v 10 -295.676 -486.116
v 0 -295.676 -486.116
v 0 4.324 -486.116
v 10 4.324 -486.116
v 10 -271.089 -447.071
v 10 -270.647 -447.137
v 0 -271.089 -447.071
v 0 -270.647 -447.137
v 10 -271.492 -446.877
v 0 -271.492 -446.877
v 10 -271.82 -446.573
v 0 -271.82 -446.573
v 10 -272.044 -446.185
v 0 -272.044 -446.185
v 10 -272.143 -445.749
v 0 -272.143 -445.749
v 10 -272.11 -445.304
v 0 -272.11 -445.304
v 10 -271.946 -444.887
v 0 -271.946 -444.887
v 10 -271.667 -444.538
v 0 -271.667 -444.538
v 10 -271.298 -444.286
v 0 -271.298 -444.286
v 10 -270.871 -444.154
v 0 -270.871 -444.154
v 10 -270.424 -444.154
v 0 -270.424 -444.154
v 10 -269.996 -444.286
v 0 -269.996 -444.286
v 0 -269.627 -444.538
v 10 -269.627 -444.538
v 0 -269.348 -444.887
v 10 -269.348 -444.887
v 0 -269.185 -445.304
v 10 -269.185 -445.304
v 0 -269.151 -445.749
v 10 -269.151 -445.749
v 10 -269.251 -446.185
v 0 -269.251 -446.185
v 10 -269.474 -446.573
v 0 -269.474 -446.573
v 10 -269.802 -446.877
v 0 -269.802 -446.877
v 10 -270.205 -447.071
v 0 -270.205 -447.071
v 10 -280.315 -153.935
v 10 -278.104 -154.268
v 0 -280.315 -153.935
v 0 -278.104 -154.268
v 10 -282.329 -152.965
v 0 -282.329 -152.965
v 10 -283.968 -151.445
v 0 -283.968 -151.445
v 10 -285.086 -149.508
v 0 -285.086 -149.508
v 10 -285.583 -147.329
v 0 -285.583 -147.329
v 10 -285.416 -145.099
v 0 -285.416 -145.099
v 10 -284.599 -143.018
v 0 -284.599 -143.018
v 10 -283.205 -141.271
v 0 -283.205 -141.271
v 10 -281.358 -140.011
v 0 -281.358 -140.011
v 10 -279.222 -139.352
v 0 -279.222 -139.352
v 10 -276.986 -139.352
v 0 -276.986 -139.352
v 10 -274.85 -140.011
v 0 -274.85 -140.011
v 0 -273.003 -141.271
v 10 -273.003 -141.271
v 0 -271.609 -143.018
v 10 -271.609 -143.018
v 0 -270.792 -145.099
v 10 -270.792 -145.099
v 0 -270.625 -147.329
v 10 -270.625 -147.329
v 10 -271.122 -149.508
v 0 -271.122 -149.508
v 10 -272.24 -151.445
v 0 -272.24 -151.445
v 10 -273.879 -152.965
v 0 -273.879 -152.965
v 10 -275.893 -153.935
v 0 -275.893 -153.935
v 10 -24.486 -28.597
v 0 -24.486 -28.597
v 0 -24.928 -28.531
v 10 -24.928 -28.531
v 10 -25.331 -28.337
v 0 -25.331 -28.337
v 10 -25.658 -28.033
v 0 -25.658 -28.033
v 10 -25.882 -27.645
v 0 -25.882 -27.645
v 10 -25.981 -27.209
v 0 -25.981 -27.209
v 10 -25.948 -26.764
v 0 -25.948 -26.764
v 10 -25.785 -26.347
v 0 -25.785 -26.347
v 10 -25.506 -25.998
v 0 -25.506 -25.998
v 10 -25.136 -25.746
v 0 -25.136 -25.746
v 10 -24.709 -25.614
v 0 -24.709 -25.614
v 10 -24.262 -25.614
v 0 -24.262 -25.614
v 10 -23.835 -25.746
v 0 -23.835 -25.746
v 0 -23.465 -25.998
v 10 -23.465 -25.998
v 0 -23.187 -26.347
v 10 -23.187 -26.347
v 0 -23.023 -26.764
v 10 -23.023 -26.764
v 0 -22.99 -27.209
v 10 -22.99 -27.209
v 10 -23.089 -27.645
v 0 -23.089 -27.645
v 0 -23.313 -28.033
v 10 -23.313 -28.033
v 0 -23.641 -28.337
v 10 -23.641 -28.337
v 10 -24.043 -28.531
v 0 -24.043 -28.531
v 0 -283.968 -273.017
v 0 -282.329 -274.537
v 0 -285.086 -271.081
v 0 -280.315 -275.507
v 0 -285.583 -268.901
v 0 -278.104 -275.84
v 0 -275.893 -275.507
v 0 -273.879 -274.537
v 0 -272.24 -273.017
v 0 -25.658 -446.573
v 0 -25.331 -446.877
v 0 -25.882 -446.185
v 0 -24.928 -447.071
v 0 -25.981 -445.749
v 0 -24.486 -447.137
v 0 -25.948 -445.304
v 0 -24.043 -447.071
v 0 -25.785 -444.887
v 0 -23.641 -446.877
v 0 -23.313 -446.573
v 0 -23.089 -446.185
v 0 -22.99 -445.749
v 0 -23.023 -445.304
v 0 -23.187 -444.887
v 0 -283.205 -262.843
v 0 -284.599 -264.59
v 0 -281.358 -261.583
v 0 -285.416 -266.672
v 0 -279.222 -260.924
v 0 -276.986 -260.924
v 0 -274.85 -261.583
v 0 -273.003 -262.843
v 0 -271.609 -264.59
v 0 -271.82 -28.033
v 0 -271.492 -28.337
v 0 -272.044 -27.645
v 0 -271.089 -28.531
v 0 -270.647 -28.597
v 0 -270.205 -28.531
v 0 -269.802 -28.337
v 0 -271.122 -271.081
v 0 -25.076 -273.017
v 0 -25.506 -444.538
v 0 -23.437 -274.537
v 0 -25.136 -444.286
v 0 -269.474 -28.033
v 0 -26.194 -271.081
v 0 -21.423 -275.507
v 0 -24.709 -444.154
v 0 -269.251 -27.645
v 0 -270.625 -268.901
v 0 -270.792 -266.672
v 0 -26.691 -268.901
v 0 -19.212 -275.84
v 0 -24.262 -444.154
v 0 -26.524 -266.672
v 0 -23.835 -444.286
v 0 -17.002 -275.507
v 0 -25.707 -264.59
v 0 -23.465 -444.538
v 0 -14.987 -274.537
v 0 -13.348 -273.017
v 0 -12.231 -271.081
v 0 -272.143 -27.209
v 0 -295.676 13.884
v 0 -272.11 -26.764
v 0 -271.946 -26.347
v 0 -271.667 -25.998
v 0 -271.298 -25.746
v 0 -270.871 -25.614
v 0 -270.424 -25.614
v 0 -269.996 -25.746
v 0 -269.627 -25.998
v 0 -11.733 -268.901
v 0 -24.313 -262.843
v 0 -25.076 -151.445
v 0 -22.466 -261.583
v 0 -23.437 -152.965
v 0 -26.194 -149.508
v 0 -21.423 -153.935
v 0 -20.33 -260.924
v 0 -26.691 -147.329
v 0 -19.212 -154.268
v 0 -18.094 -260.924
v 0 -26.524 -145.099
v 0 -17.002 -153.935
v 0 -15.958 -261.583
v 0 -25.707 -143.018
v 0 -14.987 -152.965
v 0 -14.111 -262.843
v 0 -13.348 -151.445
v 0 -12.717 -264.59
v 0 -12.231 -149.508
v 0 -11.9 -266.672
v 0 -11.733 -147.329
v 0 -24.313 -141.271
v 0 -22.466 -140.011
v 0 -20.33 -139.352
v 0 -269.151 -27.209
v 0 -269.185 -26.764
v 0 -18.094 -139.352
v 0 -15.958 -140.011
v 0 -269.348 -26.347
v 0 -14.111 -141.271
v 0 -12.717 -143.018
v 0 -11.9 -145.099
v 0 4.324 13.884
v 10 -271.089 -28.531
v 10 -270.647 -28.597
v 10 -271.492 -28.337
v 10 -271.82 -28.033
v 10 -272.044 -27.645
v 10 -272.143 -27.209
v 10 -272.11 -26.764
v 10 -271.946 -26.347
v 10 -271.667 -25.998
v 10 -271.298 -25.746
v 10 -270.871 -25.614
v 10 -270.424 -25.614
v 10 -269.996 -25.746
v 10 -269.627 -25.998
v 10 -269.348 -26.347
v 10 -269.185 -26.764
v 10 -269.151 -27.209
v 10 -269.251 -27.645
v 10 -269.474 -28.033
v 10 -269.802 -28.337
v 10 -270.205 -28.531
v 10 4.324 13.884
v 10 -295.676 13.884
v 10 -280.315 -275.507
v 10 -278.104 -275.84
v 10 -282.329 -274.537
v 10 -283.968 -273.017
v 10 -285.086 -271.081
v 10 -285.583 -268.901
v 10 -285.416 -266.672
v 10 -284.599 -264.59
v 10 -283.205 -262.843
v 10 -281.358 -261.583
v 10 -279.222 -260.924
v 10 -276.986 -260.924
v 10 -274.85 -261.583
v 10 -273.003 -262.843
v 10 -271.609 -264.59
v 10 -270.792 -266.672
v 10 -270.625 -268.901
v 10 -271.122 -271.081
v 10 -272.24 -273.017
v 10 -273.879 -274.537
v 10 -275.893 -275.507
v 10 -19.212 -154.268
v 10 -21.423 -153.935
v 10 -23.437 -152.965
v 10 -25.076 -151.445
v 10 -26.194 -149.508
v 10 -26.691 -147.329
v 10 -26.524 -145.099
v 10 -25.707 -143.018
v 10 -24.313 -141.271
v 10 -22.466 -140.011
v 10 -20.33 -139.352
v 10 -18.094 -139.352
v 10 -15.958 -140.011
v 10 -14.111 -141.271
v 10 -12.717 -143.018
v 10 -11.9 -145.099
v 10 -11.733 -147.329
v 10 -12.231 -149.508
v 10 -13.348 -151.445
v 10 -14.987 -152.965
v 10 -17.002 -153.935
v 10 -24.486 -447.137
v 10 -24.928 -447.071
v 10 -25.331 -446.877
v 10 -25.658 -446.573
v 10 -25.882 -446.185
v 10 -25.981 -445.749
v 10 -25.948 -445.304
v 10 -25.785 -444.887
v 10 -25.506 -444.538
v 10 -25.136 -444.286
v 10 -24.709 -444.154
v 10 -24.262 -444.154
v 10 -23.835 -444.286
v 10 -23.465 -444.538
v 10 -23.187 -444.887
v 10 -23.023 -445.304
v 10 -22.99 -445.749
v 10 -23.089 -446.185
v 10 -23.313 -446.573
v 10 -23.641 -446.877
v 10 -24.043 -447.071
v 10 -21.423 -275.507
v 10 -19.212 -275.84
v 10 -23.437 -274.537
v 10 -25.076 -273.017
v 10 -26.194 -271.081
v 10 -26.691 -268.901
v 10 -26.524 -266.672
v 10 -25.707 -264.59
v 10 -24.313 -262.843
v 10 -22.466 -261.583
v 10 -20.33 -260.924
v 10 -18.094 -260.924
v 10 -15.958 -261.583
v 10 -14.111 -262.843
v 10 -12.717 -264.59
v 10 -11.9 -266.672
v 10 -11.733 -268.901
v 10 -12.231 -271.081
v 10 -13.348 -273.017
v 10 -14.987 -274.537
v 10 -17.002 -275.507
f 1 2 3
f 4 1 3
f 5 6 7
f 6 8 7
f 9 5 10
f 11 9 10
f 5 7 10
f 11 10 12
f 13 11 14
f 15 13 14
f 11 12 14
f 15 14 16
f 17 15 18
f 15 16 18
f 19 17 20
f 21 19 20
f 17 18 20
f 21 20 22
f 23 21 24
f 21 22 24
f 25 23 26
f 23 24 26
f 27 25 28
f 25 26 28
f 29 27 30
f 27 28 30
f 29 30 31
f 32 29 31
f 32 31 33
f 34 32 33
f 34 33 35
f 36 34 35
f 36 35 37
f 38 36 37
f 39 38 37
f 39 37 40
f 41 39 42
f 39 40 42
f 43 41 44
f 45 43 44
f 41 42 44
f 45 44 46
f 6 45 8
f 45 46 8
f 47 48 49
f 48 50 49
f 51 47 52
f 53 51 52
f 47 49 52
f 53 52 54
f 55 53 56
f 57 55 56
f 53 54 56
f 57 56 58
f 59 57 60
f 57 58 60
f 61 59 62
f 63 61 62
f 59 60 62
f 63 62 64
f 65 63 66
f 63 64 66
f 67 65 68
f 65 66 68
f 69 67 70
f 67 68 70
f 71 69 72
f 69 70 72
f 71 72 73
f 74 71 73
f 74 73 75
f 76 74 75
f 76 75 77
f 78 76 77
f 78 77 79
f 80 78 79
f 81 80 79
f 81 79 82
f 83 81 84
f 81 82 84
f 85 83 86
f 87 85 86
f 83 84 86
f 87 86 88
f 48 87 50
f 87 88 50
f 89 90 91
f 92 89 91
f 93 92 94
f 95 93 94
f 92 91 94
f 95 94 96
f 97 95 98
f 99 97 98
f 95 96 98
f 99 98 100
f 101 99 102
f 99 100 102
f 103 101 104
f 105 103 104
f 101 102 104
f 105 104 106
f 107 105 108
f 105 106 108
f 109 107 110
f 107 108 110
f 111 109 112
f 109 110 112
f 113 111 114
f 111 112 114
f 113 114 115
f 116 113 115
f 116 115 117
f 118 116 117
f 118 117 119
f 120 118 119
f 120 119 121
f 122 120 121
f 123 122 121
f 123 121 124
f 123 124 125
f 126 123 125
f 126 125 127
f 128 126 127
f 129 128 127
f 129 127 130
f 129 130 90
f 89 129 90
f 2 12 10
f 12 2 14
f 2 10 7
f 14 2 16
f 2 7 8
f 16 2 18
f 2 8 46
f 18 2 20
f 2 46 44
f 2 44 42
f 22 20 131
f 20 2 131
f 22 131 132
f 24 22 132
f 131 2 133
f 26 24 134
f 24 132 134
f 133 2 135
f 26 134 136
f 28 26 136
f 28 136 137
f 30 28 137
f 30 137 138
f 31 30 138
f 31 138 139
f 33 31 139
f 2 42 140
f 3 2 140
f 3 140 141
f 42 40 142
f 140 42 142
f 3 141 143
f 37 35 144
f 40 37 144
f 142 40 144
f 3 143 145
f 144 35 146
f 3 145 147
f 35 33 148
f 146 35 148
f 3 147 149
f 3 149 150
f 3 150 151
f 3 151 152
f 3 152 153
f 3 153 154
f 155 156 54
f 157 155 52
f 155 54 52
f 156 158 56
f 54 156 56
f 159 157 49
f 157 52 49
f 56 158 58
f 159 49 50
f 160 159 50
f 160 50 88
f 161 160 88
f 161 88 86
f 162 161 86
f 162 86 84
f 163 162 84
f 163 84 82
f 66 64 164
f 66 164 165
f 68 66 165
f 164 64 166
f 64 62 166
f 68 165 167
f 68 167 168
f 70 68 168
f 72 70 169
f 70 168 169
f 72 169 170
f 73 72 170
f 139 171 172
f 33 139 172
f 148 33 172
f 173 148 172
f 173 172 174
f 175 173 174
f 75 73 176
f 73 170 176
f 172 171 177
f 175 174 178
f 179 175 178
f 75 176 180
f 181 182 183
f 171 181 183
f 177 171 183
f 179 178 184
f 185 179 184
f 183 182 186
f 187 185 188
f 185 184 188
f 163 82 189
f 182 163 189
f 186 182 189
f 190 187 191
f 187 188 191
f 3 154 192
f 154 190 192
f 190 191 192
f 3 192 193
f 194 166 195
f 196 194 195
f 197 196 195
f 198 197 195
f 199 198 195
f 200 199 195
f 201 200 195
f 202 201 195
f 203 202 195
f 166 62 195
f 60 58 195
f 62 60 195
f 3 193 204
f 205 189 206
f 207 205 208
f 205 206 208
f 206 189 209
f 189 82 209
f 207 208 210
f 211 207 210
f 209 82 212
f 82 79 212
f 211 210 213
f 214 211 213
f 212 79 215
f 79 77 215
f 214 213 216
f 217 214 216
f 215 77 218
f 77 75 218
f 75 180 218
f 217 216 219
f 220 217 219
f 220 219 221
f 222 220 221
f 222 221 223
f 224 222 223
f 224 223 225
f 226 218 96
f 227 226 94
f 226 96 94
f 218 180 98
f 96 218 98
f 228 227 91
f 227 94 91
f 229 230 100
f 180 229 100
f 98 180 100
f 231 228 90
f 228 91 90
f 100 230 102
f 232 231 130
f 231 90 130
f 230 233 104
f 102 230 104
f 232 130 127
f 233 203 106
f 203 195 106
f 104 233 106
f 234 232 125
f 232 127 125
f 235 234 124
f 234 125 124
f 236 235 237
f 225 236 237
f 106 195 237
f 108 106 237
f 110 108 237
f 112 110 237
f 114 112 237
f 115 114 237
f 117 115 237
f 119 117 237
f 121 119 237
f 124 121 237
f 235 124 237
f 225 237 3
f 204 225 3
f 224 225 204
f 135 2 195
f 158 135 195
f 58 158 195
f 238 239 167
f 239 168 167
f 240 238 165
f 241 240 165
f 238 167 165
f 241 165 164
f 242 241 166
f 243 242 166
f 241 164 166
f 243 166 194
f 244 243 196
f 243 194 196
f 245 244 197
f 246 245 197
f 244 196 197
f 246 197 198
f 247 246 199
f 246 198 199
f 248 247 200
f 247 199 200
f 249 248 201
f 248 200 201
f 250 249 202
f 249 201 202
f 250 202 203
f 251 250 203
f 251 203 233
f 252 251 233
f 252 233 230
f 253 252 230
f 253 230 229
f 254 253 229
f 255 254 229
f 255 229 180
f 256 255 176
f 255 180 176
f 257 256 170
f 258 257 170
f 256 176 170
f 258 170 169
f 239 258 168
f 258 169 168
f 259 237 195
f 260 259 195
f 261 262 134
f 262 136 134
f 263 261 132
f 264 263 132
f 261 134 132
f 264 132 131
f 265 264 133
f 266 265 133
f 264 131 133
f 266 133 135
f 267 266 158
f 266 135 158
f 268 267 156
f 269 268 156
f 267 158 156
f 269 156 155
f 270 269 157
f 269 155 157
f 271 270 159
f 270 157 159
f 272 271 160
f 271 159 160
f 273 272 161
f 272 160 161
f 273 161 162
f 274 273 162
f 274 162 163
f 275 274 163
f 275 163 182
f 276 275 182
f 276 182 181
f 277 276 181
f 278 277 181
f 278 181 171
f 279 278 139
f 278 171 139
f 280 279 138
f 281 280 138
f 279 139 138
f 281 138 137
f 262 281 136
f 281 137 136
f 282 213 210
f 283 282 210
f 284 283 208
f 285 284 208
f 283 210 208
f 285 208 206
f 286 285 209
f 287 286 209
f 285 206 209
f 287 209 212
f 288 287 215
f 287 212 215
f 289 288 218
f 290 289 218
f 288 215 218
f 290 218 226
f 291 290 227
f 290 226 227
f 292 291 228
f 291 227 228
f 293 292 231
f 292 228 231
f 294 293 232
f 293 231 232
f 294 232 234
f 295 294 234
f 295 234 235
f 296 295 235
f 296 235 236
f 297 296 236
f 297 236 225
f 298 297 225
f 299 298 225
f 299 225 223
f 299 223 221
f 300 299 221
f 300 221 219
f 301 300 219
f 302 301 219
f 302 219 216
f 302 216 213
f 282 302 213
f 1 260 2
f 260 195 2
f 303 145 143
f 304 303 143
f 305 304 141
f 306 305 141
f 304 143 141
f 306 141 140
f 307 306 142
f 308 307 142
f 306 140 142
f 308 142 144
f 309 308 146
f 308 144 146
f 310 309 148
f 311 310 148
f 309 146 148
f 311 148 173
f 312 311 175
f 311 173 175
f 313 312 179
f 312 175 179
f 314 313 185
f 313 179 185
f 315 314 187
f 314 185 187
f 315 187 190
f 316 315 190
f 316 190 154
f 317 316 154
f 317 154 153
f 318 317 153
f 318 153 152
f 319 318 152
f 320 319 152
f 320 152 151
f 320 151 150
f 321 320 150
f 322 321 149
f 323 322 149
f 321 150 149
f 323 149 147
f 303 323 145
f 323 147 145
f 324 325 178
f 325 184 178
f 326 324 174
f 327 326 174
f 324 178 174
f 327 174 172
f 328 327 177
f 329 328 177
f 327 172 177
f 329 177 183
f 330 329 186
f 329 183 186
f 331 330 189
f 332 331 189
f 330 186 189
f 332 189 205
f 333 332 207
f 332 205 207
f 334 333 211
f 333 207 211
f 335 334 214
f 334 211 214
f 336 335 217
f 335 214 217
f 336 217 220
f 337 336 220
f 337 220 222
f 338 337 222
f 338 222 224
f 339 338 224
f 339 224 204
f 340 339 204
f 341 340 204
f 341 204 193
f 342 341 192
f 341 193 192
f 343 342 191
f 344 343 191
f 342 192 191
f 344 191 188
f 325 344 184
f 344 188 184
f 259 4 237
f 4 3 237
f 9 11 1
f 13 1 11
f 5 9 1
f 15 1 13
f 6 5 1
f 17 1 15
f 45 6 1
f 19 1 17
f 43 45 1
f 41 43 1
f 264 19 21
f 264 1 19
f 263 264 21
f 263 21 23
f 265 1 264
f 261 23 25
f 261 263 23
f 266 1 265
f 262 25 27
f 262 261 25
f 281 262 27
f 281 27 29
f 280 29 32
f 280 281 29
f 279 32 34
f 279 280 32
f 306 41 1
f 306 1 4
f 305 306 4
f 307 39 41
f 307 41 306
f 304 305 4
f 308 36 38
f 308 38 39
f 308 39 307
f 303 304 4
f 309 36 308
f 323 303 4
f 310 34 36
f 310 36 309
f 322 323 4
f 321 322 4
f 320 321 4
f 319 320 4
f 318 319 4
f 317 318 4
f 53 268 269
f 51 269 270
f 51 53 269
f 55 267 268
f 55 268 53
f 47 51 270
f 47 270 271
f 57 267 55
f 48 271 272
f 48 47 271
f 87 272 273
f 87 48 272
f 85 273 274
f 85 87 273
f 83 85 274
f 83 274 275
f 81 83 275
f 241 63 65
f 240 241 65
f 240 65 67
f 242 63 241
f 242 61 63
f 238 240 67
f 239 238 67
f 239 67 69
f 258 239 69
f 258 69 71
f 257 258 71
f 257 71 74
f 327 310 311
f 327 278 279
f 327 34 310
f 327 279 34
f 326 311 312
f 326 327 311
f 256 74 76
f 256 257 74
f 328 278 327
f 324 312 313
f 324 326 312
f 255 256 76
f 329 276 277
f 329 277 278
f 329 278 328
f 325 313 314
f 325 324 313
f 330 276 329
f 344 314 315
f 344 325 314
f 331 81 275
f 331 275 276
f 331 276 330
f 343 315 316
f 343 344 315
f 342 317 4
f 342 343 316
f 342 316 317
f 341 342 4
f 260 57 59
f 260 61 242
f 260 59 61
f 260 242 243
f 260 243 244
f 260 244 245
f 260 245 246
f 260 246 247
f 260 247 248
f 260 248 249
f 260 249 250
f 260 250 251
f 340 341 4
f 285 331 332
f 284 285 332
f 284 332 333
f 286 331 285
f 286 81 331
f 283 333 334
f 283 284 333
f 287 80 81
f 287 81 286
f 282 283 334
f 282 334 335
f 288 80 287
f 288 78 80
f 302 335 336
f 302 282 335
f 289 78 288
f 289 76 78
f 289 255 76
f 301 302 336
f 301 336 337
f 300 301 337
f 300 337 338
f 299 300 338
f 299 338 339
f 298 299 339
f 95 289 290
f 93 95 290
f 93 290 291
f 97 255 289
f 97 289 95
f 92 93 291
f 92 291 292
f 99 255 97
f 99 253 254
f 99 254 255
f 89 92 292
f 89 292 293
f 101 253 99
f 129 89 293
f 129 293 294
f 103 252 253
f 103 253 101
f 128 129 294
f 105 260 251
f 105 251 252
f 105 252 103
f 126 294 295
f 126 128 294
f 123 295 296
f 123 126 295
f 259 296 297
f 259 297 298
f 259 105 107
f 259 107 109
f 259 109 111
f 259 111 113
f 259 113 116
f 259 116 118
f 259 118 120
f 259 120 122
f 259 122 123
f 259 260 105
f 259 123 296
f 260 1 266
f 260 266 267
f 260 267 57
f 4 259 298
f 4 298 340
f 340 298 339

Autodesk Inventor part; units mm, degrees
ref_plane "YZ Plane" through (0, 0, 0) normal (1, 0, 0) x (0, 1, 0)
ref_plane "XZ Plane" through (0, 0, 0) normal (0, 1, 0) x (-1, 0, 0)
ref_plane "XY Plane" through (0, 0, 0) normal (0, 0, 1) x (1, 0, 0)
sketch "Sketch1" plane through (0, 0, 0) normal (1, 0, 0) x (0, 1, 0)
  line L0 (4.324, 13.8845) -> (-295.676, 13.8845)
  line L1 (-295.676, 13.8845) -> (-295.676, -486.1155)
  line L2 (-295.676, -486.1155) -> (4.324, -486.1155)
  line L3 (4.324, -486.1155) -> (4.324, 13.8845)
  point P0 (0, 0)
  dimension "d0" = 300
  dimension "d1" = 500
extrude "Extrusion1" add sketch "Sketch1" along normal blind 10
sketch "Sketch2" plane through (10, 0, 0) normal (1, 0, 0) x (0, 0, -1)
  line L0 (27.0974, -24.4856) -> (445.6374, -24.4856)
  line L1 (445.6374, -24.4856) -> (445.6374, -270.6472)
  line L2 (445.6374, -270.6472) -> (27.0974, -270.6472)
  line L3 (27.0974, -270.6472) -> (27.0974, -24.4856)
  point P0 (0, 0)
hole "Hole1" at (10, -24.4856, -27.0974) at (10, -24.4856, -445.6374) at (10, -270.6472, -445.6374) at (10, -270.6472, -27.0974) direction (-1, 0, 0) diameter 3 end through all
sketch "Sketch4" plane through (10, 0, 0) normal (1, 0, 0) x (0, 0, -1)
  point P0 (0, 0)
sketch "Sketch9" plane through (10, 0, 0) normal (1, 0, 0) x (0, 0, -1)
  circle A0 centre (146.7684, -19.2122) radius 7.5 projected
  line L0 (146.7684, -19.2122) -> (268.3405, -19.2122)
  line L1 (268.3405, -19.2122) -> (268.3405, -278.104)
  line L2 (268.3405, -278.104) -> (146.7684, -278.104)
  line L3 (146.7684, -278.104) -> (146.7684, -19.2122)
  point P0 (0, 0)
hole "Hole7" at (10, -19.2122, -146.7684) at (10, -19.2122, -268.3405) at (10, -278.104, -146.7684) at (10, -278.104, -268.3405) direction (-1, 0, 0) diameter 15 end through all
properties part number "exp base 1"
